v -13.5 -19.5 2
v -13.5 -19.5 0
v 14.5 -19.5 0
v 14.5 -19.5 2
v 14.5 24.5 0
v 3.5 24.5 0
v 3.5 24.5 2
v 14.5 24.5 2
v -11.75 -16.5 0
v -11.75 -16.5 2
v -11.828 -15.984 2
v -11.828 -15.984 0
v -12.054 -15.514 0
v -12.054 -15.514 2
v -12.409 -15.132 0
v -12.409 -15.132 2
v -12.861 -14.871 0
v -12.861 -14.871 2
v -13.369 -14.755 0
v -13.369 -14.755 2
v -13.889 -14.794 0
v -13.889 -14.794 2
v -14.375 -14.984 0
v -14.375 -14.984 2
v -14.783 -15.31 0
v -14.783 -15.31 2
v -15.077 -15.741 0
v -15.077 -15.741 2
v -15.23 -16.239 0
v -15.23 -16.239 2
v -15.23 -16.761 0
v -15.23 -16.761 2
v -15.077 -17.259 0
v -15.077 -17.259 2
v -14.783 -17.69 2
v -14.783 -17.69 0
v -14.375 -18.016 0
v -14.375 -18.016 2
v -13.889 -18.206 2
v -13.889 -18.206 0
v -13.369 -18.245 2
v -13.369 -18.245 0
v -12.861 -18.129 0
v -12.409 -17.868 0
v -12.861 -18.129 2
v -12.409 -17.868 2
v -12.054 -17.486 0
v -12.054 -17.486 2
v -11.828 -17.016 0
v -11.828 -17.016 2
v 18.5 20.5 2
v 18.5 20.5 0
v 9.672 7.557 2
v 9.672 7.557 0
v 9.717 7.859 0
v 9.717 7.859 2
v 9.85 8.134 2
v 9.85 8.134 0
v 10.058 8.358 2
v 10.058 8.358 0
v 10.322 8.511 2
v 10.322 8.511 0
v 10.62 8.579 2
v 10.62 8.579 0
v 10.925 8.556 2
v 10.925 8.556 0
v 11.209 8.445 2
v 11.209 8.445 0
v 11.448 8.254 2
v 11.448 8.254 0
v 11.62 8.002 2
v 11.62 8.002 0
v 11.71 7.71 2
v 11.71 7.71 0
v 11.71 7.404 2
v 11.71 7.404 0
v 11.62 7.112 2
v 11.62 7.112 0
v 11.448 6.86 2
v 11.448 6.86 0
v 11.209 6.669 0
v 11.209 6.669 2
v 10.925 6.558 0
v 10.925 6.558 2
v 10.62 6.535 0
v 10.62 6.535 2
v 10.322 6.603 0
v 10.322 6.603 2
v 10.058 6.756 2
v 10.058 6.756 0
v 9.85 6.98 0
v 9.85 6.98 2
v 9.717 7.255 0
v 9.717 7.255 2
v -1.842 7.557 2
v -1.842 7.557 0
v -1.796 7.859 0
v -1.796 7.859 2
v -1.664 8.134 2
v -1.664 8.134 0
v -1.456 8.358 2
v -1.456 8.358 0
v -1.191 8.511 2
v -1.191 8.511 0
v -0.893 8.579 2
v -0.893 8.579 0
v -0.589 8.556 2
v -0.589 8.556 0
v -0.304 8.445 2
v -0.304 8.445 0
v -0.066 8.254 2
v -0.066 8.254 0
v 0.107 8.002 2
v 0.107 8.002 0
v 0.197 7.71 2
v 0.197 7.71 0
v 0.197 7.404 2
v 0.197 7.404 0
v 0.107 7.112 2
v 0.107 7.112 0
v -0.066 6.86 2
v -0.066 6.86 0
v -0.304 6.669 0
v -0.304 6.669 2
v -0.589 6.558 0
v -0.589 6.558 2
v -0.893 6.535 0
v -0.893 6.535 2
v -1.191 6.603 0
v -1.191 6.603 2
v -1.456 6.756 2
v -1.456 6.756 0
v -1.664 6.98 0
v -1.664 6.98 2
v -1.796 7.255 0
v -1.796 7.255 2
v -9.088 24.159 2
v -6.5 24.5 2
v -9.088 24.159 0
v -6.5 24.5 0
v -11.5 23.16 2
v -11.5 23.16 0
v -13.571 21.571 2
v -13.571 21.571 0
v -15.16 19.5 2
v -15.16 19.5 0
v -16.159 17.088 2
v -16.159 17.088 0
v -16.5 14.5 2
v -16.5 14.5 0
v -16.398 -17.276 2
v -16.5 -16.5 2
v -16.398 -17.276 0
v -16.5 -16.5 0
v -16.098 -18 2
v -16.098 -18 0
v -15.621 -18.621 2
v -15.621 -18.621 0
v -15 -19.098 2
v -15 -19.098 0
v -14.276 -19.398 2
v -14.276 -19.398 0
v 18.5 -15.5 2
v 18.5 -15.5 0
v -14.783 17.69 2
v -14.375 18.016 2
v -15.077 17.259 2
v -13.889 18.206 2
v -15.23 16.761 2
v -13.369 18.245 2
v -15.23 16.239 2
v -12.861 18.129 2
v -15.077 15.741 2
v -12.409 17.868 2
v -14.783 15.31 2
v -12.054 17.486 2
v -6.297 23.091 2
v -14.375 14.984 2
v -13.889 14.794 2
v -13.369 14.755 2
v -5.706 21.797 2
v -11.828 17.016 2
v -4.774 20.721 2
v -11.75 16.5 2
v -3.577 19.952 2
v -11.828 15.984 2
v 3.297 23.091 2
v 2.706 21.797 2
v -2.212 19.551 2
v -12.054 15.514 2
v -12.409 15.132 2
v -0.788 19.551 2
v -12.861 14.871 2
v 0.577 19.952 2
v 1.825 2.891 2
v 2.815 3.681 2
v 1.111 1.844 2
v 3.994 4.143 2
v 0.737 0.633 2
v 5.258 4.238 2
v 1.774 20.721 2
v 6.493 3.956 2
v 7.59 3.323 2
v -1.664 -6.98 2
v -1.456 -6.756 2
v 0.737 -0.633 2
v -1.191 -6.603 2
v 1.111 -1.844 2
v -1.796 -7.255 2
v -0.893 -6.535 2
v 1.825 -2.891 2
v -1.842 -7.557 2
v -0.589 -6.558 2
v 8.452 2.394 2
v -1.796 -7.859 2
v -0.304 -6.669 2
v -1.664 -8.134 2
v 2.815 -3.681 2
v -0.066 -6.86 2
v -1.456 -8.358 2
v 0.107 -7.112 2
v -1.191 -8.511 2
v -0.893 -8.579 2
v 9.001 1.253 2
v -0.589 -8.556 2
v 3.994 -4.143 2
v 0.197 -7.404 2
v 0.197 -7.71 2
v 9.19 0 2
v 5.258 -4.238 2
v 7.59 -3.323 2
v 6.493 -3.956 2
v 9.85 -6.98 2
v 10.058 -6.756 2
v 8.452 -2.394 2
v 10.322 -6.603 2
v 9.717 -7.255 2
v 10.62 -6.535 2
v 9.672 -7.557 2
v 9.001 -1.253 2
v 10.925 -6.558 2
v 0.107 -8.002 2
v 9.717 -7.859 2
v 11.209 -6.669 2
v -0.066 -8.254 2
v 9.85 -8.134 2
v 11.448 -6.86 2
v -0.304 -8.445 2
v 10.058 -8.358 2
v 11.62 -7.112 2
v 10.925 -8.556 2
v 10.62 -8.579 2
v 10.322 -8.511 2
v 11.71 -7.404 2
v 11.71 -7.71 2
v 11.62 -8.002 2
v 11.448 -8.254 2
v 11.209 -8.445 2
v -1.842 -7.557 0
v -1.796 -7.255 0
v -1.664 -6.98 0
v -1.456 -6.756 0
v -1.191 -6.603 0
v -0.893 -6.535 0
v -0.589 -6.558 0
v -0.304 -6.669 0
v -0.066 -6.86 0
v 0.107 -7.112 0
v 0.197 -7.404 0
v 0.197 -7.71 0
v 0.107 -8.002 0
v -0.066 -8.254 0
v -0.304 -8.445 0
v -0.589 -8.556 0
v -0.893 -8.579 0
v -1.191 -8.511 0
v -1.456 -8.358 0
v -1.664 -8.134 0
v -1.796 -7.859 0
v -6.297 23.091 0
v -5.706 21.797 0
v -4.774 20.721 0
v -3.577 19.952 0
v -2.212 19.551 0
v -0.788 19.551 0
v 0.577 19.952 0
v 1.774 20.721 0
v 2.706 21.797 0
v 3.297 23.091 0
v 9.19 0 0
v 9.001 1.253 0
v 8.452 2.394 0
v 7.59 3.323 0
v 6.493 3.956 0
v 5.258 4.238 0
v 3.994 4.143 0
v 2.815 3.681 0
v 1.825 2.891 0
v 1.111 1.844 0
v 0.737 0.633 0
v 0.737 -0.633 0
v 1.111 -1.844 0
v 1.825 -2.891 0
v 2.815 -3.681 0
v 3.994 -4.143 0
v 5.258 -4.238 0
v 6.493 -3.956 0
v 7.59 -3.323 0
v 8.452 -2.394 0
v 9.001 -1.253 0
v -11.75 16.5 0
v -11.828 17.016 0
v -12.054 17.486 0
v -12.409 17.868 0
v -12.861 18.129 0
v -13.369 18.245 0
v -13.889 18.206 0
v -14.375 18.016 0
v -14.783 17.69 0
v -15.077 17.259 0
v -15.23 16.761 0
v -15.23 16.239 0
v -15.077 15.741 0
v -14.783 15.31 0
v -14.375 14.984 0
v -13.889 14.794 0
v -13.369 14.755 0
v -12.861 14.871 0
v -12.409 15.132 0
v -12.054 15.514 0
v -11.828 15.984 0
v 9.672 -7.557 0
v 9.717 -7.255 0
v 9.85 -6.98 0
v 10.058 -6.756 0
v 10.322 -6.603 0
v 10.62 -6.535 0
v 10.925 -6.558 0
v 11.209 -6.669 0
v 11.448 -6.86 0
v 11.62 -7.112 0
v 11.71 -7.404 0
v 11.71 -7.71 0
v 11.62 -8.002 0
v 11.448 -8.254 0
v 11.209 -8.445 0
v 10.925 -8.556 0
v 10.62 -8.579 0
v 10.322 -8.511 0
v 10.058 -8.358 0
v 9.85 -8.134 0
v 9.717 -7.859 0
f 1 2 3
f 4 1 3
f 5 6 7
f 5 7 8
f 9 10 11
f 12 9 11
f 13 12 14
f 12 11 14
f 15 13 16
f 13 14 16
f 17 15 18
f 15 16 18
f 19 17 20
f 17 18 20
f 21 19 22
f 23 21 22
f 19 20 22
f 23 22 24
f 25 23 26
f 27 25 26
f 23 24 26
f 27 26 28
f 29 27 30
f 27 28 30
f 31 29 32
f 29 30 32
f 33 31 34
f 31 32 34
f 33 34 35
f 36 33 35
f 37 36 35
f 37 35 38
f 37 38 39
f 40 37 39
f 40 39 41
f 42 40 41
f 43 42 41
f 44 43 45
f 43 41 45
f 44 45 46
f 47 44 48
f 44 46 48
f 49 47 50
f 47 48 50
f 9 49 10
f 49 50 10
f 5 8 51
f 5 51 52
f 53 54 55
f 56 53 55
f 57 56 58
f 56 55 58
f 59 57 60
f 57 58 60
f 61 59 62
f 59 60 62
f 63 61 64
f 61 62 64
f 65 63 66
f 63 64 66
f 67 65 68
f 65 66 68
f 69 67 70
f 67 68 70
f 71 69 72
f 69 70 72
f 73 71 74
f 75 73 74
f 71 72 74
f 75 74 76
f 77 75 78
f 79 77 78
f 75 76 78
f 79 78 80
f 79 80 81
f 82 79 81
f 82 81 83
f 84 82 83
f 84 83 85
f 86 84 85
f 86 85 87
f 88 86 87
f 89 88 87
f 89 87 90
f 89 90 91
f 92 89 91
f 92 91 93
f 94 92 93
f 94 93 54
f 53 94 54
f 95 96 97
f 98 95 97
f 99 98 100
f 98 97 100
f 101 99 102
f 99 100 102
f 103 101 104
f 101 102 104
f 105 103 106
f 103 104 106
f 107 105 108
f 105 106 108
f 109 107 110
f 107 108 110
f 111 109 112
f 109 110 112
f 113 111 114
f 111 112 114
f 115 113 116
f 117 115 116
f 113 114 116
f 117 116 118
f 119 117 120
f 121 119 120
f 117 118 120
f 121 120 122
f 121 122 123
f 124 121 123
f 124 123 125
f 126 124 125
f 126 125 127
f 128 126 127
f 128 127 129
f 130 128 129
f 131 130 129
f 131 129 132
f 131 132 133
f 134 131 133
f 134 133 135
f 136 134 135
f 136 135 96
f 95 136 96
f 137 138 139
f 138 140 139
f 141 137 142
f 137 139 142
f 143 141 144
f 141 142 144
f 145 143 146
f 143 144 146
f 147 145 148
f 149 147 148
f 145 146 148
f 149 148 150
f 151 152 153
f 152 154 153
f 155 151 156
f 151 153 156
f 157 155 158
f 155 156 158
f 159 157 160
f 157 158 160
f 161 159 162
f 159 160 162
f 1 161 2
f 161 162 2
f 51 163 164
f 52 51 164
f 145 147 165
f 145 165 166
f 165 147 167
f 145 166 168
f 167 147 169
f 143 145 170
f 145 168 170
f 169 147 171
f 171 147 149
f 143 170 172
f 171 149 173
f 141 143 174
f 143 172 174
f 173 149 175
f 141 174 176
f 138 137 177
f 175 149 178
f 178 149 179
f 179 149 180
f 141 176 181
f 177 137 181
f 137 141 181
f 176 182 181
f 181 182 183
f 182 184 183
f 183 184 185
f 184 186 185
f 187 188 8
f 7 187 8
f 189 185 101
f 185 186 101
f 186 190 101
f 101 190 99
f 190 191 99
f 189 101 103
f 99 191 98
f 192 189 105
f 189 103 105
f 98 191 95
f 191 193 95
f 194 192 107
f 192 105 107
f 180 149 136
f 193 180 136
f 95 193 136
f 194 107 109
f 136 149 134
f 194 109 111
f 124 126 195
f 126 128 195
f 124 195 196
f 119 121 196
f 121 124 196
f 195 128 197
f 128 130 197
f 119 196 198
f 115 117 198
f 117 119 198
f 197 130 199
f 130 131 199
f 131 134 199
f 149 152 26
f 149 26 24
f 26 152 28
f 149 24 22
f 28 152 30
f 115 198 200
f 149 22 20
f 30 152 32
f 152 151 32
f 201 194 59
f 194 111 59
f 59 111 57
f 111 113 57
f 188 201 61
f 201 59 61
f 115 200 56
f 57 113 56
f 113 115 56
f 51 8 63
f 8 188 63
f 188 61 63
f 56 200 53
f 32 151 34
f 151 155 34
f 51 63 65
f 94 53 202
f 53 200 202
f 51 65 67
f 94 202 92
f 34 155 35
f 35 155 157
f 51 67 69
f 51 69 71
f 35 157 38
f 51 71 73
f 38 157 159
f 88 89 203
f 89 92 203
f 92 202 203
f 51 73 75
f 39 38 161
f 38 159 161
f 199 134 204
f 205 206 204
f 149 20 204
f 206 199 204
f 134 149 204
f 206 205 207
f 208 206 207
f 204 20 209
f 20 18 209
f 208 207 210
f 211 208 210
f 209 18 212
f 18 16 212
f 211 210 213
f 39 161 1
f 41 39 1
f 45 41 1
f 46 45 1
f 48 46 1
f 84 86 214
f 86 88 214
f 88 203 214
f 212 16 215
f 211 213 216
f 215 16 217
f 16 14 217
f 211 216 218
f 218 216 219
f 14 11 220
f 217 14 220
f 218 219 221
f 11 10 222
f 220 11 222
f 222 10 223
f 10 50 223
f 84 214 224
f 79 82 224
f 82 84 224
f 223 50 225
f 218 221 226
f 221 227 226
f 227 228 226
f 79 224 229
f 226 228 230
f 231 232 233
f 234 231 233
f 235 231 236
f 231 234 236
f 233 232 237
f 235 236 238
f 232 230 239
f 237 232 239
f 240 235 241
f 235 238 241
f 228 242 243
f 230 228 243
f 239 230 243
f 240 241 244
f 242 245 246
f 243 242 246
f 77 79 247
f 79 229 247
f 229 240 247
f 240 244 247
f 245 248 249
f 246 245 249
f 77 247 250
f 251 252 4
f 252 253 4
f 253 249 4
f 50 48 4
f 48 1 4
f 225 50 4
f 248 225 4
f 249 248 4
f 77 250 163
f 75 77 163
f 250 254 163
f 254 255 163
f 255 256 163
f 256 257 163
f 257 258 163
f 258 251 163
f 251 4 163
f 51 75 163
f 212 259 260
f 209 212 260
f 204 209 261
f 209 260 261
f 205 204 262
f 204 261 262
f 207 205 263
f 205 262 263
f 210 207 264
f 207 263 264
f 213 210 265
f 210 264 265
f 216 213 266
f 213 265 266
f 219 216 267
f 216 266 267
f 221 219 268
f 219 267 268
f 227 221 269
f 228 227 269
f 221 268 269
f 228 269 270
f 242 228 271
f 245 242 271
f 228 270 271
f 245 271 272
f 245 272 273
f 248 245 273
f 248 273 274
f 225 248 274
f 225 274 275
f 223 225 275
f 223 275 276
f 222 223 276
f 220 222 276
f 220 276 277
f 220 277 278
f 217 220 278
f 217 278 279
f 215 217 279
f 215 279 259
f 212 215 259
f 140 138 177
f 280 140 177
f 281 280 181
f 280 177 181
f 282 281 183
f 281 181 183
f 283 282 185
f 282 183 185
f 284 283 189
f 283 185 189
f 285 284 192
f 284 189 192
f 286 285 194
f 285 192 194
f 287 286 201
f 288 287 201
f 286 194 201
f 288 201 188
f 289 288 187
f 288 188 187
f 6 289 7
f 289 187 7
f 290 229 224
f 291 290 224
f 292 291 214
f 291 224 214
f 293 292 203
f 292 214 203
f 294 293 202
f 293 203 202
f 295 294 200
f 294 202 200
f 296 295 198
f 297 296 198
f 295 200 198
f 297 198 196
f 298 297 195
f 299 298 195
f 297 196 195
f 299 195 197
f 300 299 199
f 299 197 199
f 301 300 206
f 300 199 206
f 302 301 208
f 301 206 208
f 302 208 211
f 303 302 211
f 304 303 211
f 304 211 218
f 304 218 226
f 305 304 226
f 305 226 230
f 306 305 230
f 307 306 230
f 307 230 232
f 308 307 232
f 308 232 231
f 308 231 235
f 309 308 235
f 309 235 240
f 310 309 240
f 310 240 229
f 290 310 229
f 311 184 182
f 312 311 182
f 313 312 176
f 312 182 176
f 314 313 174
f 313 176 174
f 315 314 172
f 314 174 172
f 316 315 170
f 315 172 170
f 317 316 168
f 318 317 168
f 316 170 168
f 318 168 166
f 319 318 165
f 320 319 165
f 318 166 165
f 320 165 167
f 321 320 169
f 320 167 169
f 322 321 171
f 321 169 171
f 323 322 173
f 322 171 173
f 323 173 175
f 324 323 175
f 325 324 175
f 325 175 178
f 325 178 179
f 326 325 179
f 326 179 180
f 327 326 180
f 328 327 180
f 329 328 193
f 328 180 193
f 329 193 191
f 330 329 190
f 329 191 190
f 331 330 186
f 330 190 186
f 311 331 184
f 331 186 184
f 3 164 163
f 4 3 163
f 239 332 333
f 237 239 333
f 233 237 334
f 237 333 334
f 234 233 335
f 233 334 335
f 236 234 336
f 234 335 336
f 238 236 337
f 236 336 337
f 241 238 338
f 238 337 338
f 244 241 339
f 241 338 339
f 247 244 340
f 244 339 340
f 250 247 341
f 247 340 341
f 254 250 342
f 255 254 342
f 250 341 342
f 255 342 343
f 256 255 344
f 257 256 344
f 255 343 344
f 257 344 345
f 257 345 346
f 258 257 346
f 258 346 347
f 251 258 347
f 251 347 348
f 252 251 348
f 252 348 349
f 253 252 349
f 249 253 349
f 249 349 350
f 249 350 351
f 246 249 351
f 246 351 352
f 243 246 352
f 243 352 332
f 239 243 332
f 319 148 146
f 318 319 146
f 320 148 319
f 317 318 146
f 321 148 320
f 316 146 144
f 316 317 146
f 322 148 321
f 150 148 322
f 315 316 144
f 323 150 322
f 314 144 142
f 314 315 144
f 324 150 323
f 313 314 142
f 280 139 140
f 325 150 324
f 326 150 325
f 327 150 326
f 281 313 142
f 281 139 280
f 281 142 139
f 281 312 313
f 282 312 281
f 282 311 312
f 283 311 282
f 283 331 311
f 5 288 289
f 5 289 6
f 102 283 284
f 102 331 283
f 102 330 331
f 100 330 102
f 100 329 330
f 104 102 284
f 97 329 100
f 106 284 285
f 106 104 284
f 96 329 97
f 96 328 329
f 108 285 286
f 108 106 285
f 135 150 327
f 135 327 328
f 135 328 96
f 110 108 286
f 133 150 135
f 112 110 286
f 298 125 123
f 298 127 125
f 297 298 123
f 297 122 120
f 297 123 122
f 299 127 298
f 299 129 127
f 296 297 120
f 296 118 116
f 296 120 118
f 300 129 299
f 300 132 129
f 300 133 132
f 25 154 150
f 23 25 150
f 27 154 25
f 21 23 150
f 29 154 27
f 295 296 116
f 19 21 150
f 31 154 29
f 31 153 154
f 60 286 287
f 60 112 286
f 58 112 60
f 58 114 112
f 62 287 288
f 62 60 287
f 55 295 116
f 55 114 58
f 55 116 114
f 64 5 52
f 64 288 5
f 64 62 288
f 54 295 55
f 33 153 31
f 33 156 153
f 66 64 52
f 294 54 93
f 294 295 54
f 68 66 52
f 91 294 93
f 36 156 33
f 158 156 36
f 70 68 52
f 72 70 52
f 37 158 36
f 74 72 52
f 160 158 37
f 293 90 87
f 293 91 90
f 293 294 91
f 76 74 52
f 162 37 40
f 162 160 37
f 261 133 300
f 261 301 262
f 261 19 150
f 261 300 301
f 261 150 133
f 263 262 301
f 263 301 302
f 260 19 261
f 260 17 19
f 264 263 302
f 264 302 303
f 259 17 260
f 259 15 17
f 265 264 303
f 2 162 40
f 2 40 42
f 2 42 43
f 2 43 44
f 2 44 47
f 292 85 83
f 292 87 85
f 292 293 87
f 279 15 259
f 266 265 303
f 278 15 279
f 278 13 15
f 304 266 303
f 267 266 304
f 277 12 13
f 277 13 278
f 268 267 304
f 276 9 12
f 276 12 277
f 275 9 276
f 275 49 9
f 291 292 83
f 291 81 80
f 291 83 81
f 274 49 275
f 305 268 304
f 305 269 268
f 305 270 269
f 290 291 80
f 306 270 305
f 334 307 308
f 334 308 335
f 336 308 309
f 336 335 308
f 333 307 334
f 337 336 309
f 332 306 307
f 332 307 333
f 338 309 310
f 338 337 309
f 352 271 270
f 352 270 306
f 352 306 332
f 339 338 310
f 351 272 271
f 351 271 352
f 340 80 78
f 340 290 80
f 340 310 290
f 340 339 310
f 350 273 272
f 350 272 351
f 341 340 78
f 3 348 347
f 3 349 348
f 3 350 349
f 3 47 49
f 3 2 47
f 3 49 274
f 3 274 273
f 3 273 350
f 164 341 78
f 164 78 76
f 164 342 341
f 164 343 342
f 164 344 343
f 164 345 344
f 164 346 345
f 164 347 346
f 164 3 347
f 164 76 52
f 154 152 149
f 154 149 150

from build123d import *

# Parameters (mm, degrees)
SKETCH_2_W              = 37
SKETCH_2_H              = 39
EXTRUDE_1_DEPTH         = 2
SKETCH_3_R              = 1.75
CUT_EXTRUDE_2_DEPTH     = 2
CHAMFER_3_SIZE          = 1
SKETCH_7_R              = 4.25
CUT_EXTRUDE_3_DEPTH     = 10
SKETCH_8_W              = 2
SKETCH_8_H              = 39
CUT_EXTRUDE_4_DEPTH     = 10
FILLET_3_R              = 3
M2_5_TAPPED_HOLE1_D     = 2.05
M2_5_TAPPED_HOLE1_DEPTH = 7.25
M2_5_TAPPED_HOLE1_TIP   = 0.615882135
CHAMFER2_SIZE           = 4
SKETCH_9_W              = 35
SKETCH_9_H              = 2
EXTRUDE_1_2_DEPTH       = 5
CHAMFER_5_SIZE          = 4
FILLET_4_R              = 10
SKETCH_11_R             = 5
CUT_EXTRUDE_1_DEPTH     = 31.765240126


with BuildPart() as part:
    # 草图2 → Extrude 1 (new body)
    with BuildSketch(Plane.XY):
        Rectangle(SKETCH_2_W, SKETCH_2_H)
    extrude(amount=EXTRUDE_1_DEPTH)

    # 草图3 → 拉伸2 (cut)
    with BuildSketch(Plane.XY.offset(2)):
        with Locations((-13.5, 16.5)):
            Circle(SKETCH_3_R)
        with Locations((-13.5, -16.5)):
            Circle(SKETCH_3_R)
    extrude(amount=-CUT_EXTRUDE_2_DEPTH, mode=Mode.SUBTRACT)

    # 倒角3
    chamfer_3_edges = [part.edges().sort_by_distance(p)[0] for p in [
        (-18.5, 19.5, 1),
        (-18.5, -19.5, 1),
    ]]
    chamfer(chamfer_3_edges, length=CHAMFER_3_SIZE)

    # 草图7 → 拉伸3 (cut)
    with BuildSketch(Plane.XY.offset(2)):
        with Locations((4.94, 0)):
            Circle(SKETCH_7_R)
    extrude(amount=-CUT_EXTRUDE_3_DEPTH, mode=Mode.SUBTRACT)

    # 草图8 → 拉伸4 (cut)
    with BuildSketch(Plane.XY.offset(2)):
        with Locations((-17.5, 0)):
            Rectangle(SKETCH_8_W, SKETCH_8_H)
    extrude(amount=-CUT_EXTRUDE_4_DEPTH, mode=Mode.SUBTRACT)

    # 圆角3
    fillet_3_edges = [part.edges().sort_by_distance(p)[0] for p in [
        (-16.5, -19.5, 1),
    ]]
    fillet(fillet_3_edges, radius=FILLET_3_R)

    # M2.5 Tapped Hole1
    with Locations(Plane(origin=(-0.816889803, -7.556998068, 2), x_dir=(1, 0, 0), z_dir=(0, 0, 1))):
        with Locations((0, 0), (11.513779606, 15.113996136), (0, 15.113996136), (11.513779606, 0)):
            Hole(M2_5_TAPPED_HOLE1_D / 2, depth=M2_5_TAPPED_HOLE1_DEPTH)
            with Locations((0, 0, -(M2_5_TAPPED_HOLE1_DEPTH + M2_5_TAPPED_HOLE1_TIP / 2))):  # 118° drill point
                Cone(0, M2_5_TAPPED_HOLE1_D / 2, M2_5_TAPPED_HOLE1_TIP, mode=Mode.SUBTRACT)

    # Chamfer2
    chamfer2_edges = [part.edges().sort_by_distance(p)[0] for p in [
        (18.5, -19.5, 1),
    ]]
    chamfer(chamfer2_edges, length=CHAMFER2_SIZE)

    # 草图9 → Extrude 1 2 (add)
    with BuildSketch(Plane(origin=(0, 19.5, 0), x_dir=(1, 0, 0), z_dir=(0, 1, 0))):
        with Locations((1, -1)):
            Rectangle(SKETCH_9_W, SKETCH_9_H)
    extrude(amount=EXTRUDE_1_2_DEPTH)

    # 倒角5
    chamfer_5_edges = [part.edges().sort_by_distance(p)[0] for p in [
        (18.5, 24.5, 1),
    ]]
    chamfer(chamfer_5_edges, length=CHAMFER_5_SIZE)

    # 圆角4
    fillet_4_edges = [part.edges().sort_by_distance(p)[0] for p in [
        (-16.5, 24.5, 1),
    ]]
    fillet(fillet_4_edges, radius=FILLET_4_R)

    # 草图11 → 切除-拉伸1 (cut, through all)
    with BuildSketch(Plane.XY.offset(2)):
        with Locations((-1.5, 24.5)):
            Circle(SKETCH_11_R)
    extrude(amount=-CUT_EXTRUDE_1_DEPTH, mode=Mode.SUBTRACT)


solid = part.part
